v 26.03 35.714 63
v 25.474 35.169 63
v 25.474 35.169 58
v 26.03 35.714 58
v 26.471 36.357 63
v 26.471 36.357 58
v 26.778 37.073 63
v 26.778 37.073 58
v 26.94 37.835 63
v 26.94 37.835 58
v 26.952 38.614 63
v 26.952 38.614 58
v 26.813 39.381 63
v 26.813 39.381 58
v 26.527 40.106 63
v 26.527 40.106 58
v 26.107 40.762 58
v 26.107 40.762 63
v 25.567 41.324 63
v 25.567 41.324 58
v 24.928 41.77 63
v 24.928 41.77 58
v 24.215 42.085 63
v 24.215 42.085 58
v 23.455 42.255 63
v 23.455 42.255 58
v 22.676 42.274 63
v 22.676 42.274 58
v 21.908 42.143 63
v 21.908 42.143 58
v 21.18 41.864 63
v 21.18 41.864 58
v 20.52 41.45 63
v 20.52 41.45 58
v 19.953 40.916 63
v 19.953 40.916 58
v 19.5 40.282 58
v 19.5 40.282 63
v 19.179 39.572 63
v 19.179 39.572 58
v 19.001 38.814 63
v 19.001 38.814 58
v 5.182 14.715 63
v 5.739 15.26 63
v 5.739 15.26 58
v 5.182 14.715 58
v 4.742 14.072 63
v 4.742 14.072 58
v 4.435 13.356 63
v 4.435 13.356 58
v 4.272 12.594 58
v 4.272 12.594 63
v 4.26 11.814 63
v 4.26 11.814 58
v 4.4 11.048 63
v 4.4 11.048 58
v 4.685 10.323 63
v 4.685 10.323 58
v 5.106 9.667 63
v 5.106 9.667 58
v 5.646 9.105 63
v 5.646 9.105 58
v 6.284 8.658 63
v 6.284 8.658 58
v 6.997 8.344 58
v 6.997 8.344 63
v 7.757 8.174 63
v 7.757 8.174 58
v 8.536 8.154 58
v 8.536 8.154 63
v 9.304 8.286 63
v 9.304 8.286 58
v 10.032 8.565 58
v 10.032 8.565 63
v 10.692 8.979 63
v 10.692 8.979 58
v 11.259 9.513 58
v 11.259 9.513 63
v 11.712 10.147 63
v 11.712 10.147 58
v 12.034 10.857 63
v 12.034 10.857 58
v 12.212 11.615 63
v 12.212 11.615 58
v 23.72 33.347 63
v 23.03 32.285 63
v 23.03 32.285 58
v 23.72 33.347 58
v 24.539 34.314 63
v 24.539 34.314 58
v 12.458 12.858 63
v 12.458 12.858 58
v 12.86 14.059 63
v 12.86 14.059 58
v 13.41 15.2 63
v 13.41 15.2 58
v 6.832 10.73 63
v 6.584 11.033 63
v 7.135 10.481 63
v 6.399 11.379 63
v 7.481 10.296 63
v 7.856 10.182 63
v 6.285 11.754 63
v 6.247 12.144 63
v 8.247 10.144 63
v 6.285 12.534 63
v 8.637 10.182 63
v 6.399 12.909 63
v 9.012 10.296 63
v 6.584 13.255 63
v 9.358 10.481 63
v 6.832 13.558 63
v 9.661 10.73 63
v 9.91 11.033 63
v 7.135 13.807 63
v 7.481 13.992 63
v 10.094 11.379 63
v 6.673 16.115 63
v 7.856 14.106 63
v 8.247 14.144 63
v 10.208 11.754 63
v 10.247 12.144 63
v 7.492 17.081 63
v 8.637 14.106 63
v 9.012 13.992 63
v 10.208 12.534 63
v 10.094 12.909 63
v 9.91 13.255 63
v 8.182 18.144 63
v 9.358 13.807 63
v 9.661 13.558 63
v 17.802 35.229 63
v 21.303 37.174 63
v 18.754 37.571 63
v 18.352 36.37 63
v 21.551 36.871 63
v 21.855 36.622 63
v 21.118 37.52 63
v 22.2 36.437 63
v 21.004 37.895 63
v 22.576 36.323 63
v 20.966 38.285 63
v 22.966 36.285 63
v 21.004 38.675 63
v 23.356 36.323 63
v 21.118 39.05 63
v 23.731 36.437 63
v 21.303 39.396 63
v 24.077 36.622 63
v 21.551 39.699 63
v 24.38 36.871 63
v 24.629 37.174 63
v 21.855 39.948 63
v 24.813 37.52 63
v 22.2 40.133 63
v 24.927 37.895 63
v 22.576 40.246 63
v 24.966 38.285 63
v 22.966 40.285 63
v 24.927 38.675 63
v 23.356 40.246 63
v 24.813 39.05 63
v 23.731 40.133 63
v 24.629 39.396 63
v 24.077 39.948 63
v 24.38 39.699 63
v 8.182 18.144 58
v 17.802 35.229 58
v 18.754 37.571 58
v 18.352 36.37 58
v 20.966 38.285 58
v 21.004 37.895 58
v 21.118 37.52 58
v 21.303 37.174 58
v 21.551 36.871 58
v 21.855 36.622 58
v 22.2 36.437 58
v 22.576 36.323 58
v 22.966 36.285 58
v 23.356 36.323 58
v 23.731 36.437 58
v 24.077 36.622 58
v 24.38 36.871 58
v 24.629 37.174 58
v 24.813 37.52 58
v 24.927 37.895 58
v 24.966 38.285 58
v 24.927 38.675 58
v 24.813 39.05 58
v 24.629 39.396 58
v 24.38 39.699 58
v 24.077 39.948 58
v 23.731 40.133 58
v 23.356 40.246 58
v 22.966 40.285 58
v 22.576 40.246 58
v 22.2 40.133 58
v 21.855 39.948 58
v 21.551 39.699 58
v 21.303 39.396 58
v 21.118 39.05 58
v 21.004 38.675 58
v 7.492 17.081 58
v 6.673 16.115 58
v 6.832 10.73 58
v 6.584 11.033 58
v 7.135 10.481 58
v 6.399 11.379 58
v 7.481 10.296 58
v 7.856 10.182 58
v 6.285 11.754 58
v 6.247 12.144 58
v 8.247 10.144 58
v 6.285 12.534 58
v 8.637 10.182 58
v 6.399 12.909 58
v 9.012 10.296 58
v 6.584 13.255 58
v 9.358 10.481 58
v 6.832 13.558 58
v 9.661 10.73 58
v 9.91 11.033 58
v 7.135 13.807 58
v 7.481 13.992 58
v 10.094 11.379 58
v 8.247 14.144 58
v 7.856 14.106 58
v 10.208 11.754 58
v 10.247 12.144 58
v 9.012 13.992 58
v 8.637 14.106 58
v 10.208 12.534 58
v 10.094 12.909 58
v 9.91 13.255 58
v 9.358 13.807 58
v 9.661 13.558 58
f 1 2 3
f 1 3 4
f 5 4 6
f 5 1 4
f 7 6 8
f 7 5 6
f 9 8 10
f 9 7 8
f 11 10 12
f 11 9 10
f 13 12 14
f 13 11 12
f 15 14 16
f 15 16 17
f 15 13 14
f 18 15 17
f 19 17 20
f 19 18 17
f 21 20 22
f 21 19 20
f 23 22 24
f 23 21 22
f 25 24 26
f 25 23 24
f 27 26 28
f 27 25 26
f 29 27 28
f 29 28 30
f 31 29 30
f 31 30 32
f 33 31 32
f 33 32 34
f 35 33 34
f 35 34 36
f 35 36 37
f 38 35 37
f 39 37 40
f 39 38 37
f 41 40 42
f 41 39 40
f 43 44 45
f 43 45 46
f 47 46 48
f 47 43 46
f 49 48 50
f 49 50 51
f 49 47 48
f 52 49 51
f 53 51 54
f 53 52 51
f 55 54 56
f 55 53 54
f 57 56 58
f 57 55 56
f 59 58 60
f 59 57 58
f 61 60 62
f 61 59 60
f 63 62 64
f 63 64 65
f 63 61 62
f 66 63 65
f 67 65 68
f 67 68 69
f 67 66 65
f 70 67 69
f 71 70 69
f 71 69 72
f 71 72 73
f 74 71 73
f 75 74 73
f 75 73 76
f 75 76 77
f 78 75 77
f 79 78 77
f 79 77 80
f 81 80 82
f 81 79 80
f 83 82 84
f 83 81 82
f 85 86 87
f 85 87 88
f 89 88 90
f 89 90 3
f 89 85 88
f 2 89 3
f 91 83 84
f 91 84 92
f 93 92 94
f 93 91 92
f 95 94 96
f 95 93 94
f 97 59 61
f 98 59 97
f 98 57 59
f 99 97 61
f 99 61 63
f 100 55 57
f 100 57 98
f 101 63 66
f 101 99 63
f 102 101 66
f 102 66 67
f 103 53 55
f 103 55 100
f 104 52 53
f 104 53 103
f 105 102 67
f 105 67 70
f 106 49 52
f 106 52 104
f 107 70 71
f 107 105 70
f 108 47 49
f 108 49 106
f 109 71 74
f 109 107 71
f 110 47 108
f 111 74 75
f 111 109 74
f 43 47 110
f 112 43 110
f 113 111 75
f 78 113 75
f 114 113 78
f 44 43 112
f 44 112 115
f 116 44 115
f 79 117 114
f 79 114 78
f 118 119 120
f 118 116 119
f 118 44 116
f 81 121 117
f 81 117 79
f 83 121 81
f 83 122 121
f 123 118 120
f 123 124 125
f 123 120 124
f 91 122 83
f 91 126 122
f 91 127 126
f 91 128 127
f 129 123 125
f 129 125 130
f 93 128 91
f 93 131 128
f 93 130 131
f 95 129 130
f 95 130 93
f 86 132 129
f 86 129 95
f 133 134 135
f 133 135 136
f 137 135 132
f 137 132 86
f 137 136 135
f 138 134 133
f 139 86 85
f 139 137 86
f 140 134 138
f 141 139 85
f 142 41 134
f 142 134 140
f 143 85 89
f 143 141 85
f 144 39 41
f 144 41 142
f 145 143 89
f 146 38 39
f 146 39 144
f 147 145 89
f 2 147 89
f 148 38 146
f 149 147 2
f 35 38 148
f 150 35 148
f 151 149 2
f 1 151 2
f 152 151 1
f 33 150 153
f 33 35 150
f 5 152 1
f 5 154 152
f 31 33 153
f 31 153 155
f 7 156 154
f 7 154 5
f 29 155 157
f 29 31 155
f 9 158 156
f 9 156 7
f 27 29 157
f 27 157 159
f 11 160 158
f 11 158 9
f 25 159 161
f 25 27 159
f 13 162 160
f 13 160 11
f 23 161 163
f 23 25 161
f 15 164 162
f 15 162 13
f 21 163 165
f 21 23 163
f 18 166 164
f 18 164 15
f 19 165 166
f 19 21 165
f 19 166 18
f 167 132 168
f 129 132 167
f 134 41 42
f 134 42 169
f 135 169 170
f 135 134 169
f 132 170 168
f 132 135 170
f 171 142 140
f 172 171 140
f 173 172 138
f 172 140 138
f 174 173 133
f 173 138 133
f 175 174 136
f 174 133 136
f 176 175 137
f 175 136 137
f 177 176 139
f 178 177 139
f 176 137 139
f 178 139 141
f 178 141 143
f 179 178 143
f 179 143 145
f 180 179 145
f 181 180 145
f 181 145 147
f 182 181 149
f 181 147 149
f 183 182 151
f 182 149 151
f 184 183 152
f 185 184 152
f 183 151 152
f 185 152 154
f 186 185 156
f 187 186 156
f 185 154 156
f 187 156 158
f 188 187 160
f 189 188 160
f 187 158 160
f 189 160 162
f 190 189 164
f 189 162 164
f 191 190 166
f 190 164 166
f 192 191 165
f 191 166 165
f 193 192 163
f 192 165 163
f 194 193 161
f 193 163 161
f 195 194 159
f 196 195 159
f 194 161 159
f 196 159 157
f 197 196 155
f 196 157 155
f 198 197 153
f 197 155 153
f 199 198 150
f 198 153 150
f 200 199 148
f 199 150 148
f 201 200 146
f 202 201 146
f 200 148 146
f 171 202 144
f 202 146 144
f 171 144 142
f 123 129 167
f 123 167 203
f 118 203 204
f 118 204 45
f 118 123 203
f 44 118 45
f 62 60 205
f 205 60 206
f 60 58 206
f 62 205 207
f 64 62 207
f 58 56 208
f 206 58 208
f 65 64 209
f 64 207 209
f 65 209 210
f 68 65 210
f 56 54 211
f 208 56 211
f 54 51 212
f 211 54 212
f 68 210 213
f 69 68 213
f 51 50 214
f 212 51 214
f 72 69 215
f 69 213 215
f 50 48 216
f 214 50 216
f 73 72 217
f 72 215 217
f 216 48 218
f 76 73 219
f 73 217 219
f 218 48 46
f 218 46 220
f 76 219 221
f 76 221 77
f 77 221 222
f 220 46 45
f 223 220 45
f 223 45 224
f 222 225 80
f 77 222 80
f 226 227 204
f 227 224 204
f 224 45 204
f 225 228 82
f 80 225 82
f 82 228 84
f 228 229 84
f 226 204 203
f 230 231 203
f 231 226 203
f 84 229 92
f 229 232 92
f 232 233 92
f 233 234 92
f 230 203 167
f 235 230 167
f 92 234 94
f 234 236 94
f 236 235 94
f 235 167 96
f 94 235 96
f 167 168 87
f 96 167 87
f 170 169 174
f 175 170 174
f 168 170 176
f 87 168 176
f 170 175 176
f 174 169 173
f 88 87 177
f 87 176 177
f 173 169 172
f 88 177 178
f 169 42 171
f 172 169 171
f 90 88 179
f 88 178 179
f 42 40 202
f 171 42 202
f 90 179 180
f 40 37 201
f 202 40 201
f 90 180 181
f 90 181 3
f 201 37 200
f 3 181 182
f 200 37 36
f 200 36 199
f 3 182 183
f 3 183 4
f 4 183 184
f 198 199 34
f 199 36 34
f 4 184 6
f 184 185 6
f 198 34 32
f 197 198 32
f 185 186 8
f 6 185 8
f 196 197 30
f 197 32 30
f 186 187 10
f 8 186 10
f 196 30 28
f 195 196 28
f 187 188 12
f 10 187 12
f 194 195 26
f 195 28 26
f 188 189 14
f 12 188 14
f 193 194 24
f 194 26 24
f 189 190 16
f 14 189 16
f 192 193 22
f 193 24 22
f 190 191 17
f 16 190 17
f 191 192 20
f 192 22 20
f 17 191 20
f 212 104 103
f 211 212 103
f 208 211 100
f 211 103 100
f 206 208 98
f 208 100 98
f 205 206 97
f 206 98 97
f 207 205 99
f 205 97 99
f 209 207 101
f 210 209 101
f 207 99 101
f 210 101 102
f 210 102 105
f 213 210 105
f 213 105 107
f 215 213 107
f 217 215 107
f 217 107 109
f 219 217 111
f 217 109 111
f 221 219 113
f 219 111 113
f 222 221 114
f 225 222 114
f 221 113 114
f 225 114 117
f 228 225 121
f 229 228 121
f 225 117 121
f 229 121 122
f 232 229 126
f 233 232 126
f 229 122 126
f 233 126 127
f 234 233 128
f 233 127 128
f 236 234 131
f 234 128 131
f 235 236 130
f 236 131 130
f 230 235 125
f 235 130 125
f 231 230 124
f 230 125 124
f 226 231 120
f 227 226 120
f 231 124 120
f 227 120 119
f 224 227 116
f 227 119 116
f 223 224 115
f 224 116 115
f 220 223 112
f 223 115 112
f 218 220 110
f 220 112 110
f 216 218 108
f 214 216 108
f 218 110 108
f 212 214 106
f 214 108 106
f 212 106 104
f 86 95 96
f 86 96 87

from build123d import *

# Parameters (mm, degrees)
SKETCH1_R           = 2
BOSS_EXTRUDE1_DEPTH = 5


with BuildPart() as part:
    # Sketch1 → Boss-Extrude1 (new body)
    with BuildSketch(Plane.XY.offset(63)):
        with BuildLine():
            Line((13.410115914, 15.199768317), (23.030358602, 32.285219435))
            ThreePointArc((23.030358602, 32.285219435), (24.114589128, 33.843533573), (25.473776059, 35.168867371))
            ThreePointArc((25.473776059, 35.168867371), (24.928229029, 41.770329198), (19.000782012, 38.813592536))
            ThreePointArc((19.000782012, 38.813592536), (18.572370652, 36.964170331), (17.802171103, 35.229035915))
            Line((17.802171103, 35.229035915), (8.181928414, 18.143584797))
            ThreePointArc((8.181928414, 18.143584797), (7.097697889, 16.585270658), (5.738510958, 15.259936861))
            ThreePointArc((5.738510958, 15.259936861), (6.284057988, 8.658475034), (12.211505005, 11.615211695))
            ThreePointArc((12.211505005, 11.615211695), (12.639916365, 13.464633901), (13.410115914, 15.199768317))
        make_face()
        with Locations(Location((8.246602308, 12.143933367, 0), (0, 0, 180))):
            Circle(SKETCH1_R, mode=Mode.SUBTRACT)
        with Locations(Location((22.965684708, 38.284870865, 0), (0, 0, 180))):
            Circle(SKETCH1_R, mode=Mode.SUBTRACT)
    extrude(amount=-BOSS_EXTRUDE1_DEPTH)


solid = part.part
